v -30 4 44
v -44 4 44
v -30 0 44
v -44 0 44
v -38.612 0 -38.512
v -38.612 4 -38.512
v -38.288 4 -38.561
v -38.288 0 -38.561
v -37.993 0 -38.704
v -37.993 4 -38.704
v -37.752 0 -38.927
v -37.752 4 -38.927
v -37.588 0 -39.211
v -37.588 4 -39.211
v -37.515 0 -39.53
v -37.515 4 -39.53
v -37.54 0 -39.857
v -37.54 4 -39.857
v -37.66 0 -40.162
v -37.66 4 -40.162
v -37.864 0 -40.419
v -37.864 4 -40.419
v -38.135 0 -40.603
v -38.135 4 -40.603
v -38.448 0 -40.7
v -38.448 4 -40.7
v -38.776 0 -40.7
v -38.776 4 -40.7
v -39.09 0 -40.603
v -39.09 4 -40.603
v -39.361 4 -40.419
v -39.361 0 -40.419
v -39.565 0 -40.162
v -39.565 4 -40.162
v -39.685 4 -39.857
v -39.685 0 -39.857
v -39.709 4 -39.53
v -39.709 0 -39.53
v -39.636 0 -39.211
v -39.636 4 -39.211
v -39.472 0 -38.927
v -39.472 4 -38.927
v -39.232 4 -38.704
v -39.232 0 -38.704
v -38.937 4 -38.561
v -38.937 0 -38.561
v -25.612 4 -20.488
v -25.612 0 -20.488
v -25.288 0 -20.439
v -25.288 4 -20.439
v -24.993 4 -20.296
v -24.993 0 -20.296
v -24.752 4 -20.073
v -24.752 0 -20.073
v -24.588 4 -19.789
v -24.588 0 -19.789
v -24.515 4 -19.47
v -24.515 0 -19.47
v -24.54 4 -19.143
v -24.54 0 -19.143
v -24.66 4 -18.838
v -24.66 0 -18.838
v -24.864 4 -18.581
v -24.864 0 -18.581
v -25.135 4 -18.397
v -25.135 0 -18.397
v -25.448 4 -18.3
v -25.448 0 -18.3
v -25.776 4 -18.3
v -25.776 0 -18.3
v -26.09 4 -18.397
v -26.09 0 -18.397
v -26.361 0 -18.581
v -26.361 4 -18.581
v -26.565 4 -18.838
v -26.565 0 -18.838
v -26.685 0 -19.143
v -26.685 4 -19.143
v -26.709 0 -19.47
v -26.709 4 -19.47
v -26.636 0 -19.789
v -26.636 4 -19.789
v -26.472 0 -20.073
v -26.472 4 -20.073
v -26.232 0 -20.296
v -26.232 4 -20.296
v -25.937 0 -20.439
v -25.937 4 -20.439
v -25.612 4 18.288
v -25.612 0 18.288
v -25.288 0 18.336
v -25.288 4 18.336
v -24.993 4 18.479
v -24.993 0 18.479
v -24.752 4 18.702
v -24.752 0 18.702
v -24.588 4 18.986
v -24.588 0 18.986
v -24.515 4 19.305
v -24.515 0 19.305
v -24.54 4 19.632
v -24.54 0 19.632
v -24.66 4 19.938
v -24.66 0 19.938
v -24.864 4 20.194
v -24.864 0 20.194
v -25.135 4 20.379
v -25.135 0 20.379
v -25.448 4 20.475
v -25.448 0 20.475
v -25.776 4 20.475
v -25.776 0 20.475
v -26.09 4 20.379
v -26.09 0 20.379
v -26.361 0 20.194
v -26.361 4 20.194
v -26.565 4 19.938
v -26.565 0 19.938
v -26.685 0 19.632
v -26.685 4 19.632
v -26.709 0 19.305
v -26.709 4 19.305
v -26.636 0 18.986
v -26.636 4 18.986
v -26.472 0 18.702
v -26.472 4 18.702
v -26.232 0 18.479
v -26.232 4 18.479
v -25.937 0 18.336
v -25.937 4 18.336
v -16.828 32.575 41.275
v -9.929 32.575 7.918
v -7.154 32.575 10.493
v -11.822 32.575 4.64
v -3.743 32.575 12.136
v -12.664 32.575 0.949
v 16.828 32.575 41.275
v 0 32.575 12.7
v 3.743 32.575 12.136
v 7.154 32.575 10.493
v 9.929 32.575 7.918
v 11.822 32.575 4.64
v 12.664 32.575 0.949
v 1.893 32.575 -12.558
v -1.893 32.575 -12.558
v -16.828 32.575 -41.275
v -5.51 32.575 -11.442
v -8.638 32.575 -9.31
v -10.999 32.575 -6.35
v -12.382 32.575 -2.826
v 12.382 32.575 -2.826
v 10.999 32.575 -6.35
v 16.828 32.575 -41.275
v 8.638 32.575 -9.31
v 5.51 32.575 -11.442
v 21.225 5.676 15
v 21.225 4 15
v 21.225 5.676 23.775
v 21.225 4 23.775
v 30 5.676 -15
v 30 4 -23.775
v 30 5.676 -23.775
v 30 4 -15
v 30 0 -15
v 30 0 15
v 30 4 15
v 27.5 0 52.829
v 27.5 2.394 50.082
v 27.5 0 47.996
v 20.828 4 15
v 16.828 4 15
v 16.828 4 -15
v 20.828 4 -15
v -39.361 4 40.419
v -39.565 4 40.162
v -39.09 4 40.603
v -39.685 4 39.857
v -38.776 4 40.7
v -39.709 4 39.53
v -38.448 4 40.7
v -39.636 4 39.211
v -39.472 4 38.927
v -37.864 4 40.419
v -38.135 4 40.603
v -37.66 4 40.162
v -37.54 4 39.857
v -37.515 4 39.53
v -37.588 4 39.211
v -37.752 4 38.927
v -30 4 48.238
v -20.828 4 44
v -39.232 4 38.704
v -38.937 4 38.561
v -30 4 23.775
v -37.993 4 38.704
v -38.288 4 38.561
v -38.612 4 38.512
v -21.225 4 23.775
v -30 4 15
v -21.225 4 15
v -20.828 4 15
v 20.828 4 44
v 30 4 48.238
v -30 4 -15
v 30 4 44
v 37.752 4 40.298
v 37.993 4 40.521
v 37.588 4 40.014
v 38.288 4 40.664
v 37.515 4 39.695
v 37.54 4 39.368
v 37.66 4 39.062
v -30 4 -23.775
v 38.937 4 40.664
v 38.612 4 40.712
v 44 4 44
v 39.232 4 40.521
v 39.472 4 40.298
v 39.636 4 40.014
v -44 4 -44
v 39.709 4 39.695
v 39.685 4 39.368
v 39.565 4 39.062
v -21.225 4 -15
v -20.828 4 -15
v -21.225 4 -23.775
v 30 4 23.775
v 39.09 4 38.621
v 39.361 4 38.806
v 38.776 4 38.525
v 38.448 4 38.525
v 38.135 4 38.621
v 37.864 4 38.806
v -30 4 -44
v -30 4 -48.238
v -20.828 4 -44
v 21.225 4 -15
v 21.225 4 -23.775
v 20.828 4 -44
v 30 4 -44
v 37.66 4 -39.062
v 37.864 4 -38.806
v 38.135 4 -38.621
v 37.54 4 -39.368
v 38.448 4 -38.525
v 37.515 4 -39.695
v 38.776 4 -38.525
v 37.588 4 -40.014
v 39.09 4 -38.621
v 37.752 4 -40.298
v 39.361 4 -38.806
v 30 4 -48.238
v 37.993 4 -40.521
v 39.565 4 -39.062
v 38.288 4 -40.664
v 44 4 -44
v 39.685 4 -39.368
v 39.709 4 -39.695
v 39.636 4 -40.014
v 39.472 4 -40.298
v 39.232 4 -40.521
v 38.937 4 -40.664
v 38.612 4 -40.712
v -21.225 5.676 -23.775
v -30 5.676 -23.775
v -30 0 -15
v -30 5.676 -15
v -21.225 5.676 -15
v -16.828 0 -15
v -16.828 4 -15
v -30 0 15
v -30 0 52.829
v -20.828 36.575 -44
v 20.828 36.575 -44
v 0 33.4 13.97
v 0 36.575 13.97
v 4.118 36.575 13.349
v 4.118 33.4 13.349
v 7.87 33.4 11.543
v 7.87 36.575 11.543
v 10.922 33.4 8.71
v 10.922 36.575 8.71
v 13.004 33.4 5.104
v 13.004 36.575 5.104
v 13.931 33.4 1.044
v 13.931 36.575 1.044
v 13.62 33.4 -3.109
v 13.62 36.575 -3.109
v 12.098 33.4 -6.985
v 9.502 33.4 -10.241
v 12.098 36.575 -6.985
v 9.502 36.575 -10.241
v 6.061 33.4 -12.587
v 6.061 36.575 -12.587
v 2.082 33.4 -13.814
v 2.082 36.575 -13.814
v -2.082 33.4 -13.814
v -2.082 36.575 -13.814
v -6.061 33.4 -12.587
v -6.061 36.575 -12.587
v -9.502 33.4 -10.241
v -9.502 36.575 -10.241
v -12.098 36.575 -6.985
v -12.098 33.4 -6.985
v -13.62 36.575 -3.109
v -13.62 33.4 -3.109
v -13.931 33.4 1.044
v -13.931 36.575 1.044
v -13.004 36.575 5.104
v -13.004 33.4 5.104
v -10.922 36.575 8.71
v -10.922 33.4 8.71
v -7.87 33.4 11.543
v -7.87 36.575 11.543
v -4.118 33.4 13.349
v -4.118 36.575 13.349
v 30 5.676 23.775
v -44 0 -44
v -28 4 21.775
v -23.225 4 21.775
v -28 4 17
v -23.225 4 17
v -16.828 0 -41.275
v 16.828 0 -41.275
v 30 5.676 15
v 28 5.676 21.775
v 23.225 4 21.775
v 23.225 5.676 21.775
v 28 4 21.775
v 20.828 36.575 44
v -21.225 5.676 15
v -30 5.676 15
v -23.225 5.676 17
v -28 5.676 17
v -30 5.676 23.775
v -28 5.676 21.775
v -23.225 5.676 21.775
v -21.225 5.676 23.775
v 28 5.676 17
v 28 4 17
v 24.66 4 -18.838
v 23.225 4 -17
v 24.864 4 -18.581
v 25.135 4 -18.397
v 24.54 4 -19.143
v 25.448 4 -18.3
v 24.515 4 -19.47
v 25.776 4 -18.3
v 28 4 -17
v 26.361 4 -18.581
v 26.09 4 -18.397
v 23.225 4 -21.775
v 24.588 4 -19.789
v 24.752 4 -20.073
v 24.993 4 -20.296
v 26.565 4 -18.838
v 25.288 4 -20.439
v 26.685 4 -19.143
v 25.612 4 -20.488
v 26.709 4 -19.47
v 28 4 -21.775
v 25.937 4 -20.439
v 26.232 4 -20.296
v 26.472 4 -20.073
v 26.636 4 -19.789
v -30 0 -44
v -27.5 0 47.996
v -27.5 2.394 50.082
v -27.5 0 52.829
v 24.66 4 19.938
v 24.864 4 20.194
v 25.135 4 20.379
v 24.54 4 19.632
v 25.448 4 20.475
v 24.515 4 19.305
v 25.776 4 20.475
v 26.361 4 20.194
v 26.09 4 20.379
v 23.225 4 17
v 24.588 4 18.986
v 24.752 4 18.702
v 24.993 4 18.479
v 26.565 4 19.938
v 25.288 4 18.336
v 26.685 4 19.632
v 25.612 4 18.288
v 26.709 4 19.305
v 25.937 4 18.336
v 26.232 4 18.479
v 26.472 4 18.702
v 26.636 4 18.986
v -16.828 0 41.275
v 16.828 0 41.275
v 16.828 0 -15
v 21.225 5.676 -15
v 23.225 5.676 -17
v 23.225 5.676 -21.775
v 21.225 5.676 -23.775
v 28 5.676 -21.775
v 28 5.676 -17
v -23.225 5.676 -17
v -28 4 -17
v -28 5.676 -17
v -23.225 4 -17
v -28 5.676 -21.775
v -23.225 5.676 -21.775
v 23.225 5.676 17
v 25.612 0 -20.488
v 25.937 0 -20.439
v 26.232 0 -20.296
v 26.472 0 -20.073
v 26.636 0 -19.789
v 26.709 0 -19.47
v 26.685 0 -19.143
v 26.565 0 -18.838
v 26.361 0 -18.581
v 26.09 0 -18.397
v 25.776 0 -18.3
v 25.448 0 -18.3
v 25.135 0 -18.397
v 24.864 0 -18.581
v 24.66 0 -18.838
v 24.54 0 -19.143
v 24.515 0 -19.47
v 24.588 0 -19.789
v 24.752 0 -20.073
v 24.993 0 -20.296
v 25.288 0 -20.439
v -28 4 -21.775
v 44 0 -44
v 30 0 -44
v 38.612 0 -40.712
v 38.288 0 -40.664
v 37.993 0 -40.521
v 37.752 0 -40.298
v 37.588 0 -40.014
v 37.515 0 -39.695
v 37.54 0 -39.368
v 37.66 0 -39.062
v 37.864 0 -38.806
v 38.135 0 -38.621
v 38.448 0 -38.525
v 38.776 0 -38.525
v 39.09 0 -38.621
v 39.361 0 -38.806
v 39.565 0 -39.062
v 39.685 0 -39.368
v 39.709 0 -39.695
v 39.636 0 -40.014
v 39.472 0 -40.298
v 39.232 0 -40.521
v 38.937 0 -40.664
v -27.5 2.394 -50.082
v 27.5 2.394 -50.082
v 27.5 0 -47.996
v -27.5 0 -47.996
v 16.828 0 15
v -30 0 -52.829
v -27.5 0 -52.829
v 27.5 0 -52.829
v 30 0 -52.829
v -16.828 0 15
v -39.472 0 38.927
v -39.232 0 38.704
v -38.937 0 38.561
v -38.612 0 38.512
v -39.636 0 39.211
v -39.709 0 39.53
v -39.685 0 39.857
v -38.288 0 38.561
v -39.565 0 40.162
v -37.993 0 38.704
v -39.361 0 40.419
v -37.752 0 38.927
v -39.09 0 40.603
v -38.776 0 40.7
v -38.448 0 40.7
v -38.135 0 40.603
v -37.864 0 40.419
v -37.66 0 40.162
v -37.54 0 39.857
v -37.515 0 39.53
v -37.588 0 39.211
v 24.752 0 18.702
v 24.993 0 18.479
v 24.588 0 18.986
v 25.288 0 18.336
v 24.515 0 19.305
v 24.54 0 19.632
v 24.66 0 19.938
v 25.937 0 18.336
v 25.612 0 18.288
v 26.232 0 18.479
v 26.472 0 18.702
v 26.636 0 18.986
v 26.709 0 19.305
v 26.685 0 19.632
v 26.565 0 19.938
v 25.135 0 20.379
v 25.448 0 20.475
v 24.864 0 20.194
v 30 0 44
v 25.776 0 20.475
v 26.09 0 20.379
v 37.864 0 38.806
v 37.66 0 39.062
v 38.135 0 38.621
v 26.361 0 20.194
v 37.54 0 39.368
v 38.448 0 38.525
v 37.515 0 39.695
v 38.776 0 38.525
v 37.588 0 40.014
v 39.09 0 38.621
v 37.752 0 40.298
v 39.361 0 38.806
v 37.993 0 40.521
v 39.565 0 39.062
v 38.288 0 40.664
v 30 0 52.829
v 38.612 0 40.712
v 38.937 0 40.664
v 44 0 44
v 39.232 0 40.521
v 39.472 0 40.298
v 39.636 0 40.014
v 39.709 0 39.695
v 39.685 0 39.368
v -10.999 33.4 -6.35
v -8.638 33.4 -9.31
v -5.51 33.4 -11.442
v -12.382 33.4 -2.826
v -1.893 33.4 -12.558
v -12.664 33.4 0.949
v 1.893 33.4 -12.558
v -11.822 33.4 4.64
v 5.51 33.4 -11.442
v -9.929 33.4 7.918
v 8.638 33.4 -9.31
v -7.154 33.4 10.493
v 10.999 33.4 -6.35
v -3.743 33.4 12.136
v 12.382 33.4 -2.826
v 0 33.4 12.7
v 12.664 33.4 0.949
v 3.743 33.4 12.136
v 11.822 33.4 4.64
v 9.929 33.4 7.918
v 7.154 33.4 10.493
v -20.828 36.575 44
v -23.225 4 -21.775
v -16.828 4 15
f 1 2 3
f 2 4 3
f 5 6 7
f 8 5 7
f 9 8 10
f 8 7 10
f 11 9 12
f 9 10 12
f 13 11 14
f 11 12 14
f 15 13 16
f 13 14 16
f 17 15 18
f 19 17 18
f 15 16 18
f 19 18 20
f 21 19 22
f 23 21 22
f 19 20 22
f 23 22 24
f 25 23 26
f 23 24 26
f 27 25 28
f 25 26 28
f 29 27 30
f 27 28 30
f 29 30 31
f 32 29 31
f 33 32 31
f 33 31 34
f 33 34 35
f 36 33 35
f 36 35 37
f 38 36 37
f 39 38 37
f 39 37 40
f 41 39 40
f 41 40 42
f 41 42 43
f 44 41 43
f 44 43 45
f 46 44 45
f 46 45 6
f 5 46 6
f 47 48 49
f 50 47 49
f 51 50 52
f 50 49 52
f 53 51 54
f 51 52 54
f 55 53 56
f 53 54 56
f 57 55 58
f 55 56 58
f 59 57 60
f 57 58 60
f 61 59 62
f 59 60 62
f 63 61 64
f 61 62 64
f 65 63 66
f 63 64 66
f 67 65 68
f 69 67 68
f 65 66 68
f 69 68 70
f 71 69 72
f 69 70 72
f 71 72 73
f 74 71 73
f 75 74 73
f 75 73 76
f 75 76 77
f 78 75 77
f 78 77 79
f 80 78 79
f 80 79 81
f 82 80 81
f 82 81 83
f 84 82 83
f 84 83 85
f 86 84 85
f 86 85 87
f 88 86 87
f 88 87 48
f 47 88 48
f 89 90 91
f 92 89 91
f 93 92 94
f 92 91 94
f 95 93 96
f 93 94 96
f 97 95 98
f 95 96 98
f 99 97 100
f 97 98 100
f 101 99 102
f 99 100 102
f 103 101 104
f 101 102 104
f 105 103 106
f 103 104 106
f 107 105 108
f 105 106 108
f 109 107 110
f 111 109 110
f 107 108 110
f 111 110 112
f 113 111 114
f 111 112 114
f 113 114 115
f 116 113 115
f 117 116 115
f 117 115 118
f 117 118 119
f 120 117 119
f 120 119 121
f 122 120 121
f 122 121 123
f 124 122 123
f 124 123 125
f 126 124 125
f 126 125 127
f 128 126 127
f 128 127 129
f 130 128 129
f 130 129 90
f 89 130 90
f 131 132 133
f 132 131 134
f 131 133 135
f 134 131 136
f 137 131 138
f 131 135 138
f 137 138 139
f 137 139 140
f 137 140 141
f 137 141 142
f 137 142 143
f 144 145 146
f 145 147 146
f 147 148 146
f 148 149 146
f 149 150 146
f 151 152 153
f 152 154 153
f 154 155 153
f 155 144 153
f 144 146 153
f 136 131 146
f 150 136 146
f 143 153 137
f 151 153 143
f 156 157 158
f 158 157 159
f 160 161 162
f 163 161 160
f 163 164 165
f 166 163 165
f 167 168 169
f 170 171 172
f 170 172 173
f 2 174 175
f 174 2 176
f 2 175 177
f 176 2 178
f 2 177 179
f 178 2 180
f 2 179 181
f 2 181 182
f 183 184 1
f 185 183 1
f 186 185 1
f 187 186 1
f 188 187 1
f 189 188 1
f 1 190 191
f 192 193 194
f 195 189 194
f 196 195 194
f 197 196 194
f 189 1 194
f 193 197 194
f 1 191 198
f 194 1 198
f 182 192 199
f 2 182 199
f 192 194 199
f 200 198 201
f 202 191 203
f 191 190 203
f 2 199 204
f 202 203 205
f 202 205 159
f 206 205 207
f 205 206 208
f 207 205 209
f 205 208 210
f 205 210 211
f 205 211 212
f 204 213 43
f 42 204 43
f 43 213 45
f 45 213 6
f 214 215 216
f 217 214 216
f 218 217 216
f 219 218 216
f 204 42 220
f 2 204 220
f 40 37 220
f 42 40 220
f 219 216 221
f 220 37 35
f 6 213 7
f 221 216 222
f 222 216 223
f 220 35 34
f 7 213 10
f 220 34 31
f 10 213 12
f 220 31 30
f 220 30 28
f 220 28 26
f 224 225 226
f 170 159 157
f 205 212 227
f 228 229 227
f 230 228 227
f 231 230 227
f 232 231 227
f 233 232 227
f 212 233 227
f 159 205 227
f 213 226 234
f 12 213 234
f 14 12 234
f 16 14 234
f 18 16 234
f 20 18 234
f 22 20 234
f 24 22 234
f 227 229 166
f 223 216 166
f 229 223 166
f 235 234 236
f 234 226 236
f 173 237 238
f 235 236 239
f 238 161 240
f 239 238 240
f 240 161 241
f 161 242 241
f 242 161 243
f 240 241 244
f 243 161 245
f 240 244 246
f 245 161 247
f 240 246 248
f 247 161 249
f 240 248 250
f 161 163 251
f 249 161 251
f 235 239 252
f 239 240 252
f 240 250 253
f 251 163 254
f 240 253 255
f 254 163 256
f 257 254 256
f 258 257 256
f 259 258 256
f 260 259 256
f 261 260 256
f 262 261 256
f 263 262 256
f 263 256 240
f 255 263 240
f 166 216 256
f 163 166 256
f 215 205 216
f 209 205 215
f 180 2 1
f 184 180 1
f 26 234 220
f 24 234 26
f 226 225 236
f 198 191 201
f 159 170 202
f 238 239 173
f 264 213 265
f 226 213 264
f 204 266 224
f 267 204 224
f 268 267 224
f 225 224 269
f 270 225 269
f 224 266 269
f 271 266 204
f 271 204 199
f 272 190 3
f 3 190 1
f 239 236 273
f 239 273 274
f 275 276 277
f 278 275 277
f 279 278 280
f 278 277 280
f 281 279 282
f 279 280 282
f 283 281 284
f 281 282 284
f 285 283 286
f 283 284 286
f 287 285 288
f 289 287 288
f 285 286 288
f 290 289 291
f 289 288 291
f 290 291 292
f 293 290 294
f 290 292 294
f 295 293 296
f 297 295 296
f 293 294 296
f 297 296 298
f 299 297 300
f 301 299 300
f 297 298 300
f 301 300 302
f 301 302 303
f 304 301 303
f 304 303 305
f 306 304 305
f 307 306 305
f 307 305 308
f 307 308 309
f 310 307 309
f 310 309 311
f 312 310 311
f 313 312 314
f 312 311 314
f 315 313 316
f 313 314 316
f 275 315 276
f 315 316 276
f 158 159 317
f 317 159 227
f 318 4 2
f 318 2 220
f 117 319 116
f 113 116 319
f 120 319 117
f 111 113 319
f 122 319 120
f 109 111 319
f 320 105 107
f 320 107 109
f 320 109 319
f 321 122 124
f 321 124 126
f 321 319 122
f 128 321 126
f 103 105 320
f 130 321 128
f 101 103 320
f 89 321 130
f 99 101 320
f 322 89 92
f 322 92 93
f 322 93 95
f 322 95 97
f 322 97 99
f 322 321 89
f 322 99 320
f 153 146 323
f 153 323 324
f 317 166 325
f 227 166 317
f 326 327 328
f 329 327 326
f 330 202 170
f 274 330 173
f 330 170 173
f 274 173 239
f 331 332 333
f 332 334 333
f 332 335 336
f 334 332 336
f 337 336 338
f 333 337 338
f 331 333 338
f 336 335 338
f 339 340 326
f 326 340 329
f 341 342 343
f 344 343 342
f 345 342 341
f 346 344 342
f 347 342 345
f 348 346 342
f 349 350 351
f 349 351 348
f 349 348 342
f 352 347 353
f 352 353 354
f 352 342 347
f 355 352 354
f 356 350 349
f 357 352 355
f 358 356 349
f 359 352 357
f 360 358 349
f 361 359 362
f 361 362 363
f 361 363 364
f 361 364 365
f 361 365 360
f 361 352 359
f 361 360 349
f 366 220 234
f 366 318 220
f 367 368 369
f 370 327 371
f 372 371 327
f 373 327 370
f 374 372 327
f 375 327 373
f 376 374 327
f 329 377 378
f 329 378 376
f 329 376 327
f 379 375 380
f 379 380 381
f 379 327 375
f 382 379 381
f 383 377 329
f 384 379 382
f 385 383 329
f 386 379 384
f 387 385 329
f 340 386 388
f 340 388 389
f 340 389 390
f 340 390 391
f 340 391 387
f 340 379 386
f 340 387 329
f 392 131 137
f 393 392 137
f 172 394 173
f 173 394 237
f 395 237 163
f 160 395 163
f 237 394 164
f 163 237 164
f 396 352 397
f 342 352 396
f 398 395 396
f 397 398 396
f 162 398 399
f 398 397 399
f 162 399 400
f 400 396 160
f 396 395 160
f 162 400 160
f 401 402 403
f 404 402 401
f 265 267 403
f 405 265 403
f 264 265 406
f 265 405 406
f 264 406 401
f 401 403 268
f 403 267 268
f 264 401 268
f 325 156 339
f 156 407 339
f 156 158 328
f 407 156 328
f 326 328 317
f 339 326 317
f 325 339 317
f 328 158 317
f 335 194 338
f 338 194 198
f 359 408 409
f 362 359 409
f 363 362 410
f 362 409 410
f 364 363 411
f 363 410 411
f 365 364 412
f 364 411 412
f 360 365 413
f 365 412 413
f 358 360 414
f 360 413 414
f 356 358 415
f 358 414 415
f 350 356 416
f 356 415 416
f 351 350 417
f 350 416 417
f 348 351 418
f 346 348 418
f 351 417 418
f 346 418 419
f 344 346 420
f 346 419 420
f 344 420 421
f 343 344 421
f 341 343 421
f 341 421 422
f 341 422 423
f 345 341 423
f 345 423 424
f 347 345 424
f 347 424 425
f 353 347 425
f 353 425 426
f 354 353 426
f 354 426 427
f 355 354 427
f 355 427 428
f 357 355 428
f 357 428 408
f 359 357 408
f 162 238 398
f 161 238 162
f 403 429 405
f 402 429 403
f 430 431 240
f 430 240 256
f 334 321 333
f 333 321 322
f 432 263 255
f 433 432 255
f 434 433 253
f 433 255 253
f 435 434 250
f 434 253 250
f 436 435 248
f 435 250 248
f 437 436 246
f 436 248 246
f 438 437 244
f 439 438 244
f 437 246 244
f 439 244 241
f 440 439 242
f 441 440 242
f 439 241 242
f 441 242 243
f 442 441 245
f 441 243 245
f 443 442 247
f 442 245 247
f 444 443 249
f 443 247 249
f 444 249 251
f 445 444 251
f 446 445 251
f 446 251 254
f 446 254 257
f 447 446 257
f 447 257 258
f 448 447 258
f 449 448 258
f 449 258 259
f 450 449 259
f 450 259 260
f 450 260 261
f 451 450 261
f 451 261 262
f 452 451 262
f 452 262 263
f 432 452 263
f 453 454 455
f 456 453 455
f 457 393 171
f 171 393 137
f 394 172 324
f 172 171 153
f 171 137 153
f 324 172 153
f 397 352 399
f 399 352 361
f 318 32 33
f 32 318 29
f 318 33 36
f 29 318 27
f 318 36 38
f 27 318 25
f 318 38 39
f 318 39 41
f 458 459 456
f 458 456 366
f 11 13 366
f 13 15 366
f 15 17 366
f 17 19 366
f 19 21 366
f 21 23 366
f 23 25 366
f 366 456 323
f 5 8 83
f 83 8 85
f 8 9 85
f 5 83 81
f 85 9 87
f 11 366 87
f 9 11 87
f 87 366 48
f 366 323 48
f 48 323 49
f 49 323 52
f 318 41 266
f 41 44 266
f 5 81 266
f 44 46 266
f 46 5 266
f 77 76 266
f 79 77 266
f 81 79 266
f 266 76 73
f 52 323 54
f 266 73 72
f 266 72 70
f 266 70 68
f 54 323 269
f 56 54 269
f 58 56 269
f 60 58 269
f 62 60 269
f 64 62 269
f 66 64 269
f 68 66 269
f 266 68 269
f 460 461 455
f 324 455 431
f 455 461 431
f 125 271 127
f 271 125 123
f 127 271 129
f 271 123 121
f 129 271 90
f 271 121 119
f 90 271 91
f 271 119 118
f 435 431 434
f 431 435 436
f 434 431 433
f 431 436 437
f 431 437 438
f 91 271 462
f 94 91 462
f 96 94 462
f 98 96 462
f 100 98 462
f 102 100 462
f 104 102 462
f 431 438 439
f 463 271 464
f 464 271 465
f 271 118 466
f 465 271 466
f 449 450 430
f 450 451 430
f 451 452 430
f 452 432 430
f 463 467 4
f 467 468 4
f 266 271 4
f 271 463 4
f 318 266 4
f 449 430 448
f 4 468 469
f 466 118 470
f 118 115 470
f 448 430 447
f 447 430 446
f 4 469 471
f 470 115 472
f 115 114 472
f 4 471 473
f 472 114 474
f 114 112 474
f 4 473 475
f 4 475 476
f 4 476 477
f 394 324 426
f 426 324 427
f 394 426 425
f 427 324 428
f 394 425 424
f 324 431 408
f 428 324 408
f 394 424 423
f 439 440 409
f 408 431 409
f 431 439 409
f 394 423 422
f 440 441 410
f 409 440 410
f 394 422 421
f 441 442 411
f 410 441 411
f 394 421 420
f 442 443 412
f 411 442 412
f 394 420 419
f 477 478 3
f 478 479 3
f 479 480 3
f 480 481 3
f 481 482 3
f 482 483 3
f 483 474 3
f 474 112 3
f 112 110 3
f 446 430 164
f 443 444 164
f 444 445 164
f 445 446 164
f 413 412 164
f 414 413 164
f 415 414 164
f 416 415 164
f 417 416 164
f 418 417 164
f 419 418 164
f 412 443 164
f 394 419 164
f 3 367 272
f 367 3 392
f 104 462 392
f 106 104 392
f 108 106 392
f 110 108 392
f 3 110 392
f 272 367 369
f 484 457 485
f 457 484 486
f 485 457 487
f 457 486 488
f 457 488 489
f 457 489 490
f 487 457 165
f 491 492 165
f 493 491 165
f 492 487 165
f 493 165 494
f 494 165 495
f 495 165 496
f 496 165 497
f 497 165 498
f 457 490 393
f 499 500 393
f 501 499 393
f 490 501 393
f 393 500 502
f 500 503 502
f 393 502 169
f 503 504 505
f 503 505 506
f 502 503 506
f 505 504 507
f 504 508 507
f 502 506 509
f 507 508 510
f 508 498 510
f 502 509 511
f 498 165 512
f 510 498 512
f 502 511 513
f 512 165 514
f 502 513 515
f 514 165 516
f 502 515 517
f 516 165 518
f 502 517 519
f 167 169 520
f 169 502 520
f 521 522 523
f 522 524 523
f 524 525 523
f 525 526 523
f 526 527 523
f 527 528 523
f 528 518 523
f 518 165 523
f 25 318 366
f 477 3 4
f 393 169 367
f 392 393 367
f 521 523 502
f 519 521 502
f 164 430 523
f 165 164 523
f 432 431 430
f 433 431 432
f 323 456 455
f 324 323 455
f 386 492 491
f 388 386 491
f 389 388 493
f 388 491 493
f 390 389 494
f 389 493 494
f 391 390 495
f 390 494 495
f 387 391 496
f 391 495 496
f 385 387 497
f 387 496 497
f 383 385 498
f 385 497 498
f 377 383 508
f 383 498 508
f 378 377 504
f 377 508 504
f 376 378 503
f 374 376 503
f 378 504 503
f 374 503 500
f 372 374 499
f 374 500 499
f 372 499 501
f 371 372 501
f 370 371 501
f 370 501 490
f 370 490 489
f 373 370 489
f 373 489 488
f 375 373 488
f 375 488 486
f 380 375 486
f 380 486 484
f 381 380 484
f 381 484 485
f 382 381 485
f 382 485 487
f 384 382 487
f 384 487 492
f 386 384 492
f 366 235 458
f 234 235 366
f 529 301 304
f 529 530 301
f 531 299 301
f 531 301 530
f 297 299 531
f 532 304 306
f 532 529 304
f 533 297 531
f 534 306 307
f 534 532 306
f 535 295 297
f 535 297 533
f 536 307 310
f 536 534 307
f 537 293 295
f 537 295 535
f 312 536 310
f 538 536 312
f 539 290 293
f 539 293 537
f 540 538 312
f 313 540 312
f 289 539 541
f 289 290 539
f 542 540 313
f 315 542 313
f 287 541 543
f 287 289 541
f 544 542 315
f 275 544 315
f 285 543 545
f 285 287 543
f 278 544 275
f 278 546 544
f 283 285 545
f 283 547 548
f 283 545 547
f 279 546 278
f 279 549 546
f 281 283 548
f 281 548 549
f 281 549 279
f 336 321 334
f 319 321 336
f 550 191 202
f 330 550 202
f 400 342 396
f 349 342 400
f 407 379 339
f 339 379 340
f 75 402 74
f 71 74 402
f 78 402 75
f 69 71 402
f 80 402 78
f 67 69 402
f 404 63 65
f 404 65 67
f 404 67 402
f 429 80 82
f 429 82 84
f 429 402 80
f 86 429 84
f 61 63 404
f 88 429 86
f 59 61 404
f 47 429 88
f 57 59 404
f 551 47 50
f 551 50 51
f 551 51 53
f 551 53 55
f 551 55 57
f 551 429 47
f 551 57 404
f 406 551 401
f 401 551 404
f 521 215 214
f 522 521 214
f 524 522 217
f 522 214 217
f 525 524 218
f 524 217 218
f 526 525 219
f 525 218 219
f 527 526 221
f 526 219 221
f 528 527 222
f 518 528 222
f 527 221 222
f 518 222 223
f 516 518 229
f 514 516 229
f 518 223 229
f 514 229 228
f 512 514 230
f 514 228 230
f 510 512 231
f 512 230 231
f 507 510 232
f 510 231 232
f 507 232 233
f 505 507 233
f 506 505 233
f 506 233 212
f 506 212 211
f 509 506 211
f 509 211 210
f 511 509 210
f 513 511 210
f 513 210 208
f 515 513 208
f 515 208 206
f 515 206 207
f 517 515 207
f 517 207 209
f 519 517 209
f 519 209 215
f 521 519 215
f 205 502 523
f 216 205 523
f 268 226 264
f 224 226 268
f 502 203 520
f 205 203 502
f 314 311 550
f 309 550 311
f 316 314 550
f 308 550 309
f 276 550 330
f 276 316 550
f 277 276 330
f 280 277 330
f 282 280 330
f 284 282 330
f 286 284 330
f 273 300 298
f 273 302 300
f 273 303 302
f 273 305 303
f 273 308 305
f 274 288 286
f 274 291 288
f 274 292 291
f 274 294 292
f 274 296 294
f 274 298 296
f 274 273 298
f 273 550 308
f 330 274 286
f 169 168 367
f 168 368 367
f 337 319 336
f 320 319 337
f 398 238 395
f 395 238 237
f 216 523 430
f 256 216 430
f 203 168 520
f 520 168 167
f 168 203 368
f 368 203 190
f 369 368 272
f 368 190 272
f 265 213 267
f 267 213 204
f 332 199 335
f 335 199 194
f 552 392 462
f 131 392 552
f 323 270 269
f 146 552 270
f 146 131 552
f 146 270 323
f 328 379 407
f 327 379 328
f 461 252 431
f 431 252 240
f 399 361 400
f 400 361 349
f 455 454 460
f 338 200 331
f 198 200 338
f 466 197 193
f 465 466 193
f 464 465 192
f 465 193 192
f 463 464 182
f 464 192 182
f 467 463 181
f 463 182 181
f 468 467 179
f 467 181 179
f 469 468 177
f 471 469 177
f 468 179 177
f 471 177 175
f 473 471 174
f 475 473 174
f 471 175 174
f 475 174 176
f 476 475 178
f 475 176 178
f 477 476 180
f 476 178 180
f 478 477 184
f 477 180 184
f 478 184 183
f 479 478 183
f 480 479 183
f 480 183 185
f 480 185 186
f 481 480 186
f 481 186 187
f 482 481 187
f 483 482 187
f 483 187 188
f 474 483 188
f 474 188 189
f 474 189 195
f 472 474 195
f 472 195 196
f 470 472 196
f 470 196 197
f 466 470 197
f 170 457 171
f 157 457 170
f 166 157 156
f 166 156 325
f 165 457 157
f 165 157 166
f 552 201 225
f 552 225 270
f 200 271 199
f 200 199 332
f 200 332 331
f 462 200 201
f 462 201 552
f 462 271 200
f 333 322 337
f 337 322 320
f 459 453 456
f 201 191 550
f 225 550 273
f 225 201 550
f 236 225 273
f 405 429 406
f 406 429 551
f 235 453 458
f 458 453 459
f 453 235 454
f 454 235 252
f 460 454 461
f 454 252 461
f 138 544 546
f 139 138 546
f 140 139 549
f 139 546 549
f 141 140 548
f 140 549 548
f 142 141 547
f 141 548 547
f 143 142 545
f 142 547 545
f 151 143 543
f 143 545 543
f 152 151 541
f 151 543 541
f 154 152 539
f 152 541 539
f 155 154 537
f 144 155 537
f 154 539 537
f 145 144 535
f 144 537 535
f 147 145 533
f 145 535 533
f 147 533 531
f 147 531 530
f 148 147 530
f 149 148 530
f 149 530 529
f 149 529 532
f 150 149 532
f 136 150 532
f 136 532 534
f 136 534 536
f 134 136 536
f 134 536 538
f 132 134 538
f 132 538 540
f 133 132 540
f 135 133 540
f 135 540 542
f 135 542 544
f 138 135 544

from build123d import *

# Parameters (mm, degrees)
SKETCH1_W           = 88
SKETCH1_H           = 88
BOSS_EXTRUDE1_DEPTH = 4
SKETCH2_W           = 41.655
SKETCH2_H           = 88
SKETCH2_W_2         = 33.655
SKETCH2_H_2         = 82.55
BOSS_EXTRUDE2_DEPTH = 28.575
SKETCH4_W           = 33.655
SKETCH4_H           = 82.55
CUT_EXTRUDE1_DEPTH  = 69.472845895
SKETCH5_W           = 41.655
SKETCH5_H           = 88
BOSS_EXTRUDE3_DEPTH = 4
SKETCH6_R           = 13.97
CUT_EXTRUDE2_DEPTH  = 3.175
SKETCH7_R           = 12.7
CUT_EXTRUDE3_DEPTH  = 71.622659253
SKETCH8_W           = 60
SKETCH8_H           = 30
CUT_EXTRUDE4_DEPTH  = 4
SKETCH9_W           = 8.7752
SKETCH9_H           = 8.7752
SKETCH9_W_2         = 4.7752
SKETCH9_H_2         = 4.7752
BOSS_EXTRUDE4_DEPTH = 5.6764
SKETCH10_R          = 1.1
CUT_EXTRUDE5_DEPTH  = 73.17846372
SKETCH11_R          = 1.1
CUT_EXTRUDE6_DEPTH  = 71.236248654
BOSS_EXTRUDE5_DEPTH = 30
CUT_EXTRUDE7_DEPTH  = 27.5


with BuildPart() as part:
    # Sketch1 → Boss-Extrude1 (new body)
    with BuildSketch(Plane(origin=(0, 0, 0), x_dir=(1, 0, 0), z_dir=(0, 1, 0))):
        Rectangle(SKETCH1_W, SKETCH1_H)
    extrude(amount=BOSS_EXTRUDE1_DEPTH)

    # Sketch2 → Boss-Extrude2 (add)
    with BuildSketch(Plane(origin=(0, 4, 0), x_dir=(1, 0, 0), z_dir=(0, 1, 0))):
        Rectangle(SKETCH2_W, SKETCH2_H)
        Rectangle(SKETCH2_W_2, SKETCH2_H_2, mode=Mode.SUBTRACT)
    extrude(amount=BOSS_EXTRUDE2_DEPTH)

    # Sketch4 → Cut-Extrude1 (cut, through all)
    with BuildSketch(Plane(origin=(0, 4, 0), x_dir=(1, 0, 0), z_dir=(0, 1, 0))):
        Rectangle(SKETCH4_W, SKETCH4_H)
    extrude(amount=-CUT_EXTRUDE1_DEPTH, mode=Mode.SUBTRACT)

    # Sketch5 → Boss-Extrude3 (add)
    with BuildSketch(Plane(origin=(0, 32.575, 0), x_dir=(1, 0, 0), z_dir=(0, 1, 0))):
        Rectangle(SKETCH5_W, SKETCH5_H)
    extrude(amount=BOSS_EXTRUDE3_DEPTH)

    # Sketch6 → Cut-Extrude2 (cut)
    with BuildSketch(Plane(origin=(0, 36.575, 0), x_dir=(1, 0, 0), z_dir=(0, 1, 0))):
        with Locations(Location((0, 0, 0), (0, 0, 270))):
            Circle(SKETCH6_R)
    extrude(amount=-CUT_EXTRUDE2_DEPTH, mode=Mode.SUBTRACT)

    # Sketch7 → Cut-Extrude3 (cut, through all)
    with BuildSketch(Plane(origin=(0, 33.4, 0), x_dir=(1, 0, 0), z_dir=(0, 1, 0))):
        with Locations(Location((0, 0, 0), (0, 0, 270))):
            Circle(SKETCH7_R)
    extrude(amount=-CUT_EXTRUDE3_DEPTH, mode=Mode.SUBTRACT)

    # Sketch8 → Cut-Extrude4 (cut)
    with BuildSketch(Plane.XZ):
        Rectangle(SKETCH8_W, SKETCH8_H)
    extrude(amount=-CUT_EXTRUDE4_DEPTH, mode=Mode.SUBTRACT)

    # Sketch9 → Boss-Extrude4 (add)
    # profile 1 of 4: a face of its own
    with BuildSketch(Plane.XZ):
        with Locations((-25.6124, 19.3876)):
            Rectangle(SKETCH9_W, SKETCH9_H)
        with Locations((-25.6124, 19.3876)):
            Rectangle(SKETCH9_W_2, SKETCH9_H_2, mode=Mode.SUBTRACT)
    # profile 2 of 4: a face of its own
    with BuildSketch(Plane.XZ):
        with Locations((25.6124, 19.3876)):
            Rectangle(SKETCH9_W, SKETCH9_H)
        with Locations((25.6124, 19.3876)):
            Rectangle(SKETCH9_W_2, SKETCH9_H_2, mode=Mode.SUBTRACT)
    # profile 3 of 4: a face of its own
    with BuildSketch(Plane.XZ):
        with Locations((25.6124, -19.3876)):
            Rectangle(SKETCH9_W, SKETCH9_H)
        with Locations((25.6124, -19.3876)):
            Rectangle(SKETCH9_W_2, SKETCH9_H_2, mode=Mode.SUBTRACT)
    # profile 4 of 4: a face of its own
    with BuildSketch(Plane.XZ):
        with Locations((-25.6124, -19.3876)):
            Rectangle(SKETCH9_W, SKETCH9_H)
        with Locations((-25.6124, -19.3876)):
            Rectangle(SKETCH9_W_2, SKETCH9_H_2, mode=Mode.SUBTRACT)
    extrude(amount=-BOSS_EXTRUDE4_DEPTH)

    # Sketch10 → Cut-Extrude5 (cut, through all)
    with BuildSketch(Plane.XZ):
        with Locations(Location((-25.6124, 19.3876, 0), (0, 0, 270))):
            Circle(SKETCH10_R)
        with Locations(Location((25.6124, 19.3876, 0), (0, 0, 270))):
            Circle(SKETCH10_R)
        with Locations(Location((25.6124, -19.3876, 0), (0, 0, 270))):
            Circle(SKETCH10_R)
        with Locations(Location((-25.6124, -19.3876, 0), (0, 0, 270))):
            Circle(SKETCH10_R)
    extrude(amount=-CUT_EXTRUDE5_DEPTH, mode=Mode.SUBTRACT)

    # Sketch11 → Cut-Extrude6 (cut, through all)
    with BuildSketch(Plane(origin=(0, 4, 0), x_dir=(1, 0, 0), z_dir=(0, 1, 0))):
        with Locations(Location((-38.6124, 39.6124, 0), (0, 0, 270))):
            Circle(SKETCH11_R)
        with Locations(Location((38.6124, 39.6124, 0), (0, 0, 90))):
            Circle(SKETCH11_R)
        with Locations(Location((38.6124, -39.6124, 0), (0, 0, 270))):
            Circle(SKETCH11_R)
        with Locations(Location((-38.6124, -39.6124, 0), (0, 0, 90))):
            Circle(SKETCH11_R)
    extrude(amount=-CUT_EXTRUDE6_DEPTH, mode=Mode.SUBTRACT)

    # Sketch14 → Boss-Extrude5 (add, symmetric)
    with BuildSketch(Plane(origin=(0, 0, 0), x_dir=(0, 0, -1), z_dir=(1, 0, 0))):
        Polygon((-44, 4), (-48.238152403, 4), (-52.828513848, 0), (-44, 0), align=None)
        Polygon((44, 0), (44, 4), (48.238152403, 4), (52.828513848, 0), align=None)
    extrude(amount=BOSS_EXTRUDE5_DEPTH, both=True)

    # Sketch15 → Cut-Extrude7 (cut, symmetric)
    with BuildSketch(Plane(origin=(0, 0, 0), x_dir=(0, 0, -1), z_dir=(1, 0, 0))):
        Polygon((-50.081518623, 2.393707125), (-47.995663595, 0), (-50.74265882, -2.393707125), (-52.828513848, 0), align=None)
        Polygon((52.828513848, 0), (50.081518623, 2.393707125), (47.995663595, 0), (50.74265882, -2.393707125), align=None)
    extrude(amount=CUT_EXTRUDE7_DEPTH, both=True, mode=Mode.SUBTRACT)


solid = part.part
